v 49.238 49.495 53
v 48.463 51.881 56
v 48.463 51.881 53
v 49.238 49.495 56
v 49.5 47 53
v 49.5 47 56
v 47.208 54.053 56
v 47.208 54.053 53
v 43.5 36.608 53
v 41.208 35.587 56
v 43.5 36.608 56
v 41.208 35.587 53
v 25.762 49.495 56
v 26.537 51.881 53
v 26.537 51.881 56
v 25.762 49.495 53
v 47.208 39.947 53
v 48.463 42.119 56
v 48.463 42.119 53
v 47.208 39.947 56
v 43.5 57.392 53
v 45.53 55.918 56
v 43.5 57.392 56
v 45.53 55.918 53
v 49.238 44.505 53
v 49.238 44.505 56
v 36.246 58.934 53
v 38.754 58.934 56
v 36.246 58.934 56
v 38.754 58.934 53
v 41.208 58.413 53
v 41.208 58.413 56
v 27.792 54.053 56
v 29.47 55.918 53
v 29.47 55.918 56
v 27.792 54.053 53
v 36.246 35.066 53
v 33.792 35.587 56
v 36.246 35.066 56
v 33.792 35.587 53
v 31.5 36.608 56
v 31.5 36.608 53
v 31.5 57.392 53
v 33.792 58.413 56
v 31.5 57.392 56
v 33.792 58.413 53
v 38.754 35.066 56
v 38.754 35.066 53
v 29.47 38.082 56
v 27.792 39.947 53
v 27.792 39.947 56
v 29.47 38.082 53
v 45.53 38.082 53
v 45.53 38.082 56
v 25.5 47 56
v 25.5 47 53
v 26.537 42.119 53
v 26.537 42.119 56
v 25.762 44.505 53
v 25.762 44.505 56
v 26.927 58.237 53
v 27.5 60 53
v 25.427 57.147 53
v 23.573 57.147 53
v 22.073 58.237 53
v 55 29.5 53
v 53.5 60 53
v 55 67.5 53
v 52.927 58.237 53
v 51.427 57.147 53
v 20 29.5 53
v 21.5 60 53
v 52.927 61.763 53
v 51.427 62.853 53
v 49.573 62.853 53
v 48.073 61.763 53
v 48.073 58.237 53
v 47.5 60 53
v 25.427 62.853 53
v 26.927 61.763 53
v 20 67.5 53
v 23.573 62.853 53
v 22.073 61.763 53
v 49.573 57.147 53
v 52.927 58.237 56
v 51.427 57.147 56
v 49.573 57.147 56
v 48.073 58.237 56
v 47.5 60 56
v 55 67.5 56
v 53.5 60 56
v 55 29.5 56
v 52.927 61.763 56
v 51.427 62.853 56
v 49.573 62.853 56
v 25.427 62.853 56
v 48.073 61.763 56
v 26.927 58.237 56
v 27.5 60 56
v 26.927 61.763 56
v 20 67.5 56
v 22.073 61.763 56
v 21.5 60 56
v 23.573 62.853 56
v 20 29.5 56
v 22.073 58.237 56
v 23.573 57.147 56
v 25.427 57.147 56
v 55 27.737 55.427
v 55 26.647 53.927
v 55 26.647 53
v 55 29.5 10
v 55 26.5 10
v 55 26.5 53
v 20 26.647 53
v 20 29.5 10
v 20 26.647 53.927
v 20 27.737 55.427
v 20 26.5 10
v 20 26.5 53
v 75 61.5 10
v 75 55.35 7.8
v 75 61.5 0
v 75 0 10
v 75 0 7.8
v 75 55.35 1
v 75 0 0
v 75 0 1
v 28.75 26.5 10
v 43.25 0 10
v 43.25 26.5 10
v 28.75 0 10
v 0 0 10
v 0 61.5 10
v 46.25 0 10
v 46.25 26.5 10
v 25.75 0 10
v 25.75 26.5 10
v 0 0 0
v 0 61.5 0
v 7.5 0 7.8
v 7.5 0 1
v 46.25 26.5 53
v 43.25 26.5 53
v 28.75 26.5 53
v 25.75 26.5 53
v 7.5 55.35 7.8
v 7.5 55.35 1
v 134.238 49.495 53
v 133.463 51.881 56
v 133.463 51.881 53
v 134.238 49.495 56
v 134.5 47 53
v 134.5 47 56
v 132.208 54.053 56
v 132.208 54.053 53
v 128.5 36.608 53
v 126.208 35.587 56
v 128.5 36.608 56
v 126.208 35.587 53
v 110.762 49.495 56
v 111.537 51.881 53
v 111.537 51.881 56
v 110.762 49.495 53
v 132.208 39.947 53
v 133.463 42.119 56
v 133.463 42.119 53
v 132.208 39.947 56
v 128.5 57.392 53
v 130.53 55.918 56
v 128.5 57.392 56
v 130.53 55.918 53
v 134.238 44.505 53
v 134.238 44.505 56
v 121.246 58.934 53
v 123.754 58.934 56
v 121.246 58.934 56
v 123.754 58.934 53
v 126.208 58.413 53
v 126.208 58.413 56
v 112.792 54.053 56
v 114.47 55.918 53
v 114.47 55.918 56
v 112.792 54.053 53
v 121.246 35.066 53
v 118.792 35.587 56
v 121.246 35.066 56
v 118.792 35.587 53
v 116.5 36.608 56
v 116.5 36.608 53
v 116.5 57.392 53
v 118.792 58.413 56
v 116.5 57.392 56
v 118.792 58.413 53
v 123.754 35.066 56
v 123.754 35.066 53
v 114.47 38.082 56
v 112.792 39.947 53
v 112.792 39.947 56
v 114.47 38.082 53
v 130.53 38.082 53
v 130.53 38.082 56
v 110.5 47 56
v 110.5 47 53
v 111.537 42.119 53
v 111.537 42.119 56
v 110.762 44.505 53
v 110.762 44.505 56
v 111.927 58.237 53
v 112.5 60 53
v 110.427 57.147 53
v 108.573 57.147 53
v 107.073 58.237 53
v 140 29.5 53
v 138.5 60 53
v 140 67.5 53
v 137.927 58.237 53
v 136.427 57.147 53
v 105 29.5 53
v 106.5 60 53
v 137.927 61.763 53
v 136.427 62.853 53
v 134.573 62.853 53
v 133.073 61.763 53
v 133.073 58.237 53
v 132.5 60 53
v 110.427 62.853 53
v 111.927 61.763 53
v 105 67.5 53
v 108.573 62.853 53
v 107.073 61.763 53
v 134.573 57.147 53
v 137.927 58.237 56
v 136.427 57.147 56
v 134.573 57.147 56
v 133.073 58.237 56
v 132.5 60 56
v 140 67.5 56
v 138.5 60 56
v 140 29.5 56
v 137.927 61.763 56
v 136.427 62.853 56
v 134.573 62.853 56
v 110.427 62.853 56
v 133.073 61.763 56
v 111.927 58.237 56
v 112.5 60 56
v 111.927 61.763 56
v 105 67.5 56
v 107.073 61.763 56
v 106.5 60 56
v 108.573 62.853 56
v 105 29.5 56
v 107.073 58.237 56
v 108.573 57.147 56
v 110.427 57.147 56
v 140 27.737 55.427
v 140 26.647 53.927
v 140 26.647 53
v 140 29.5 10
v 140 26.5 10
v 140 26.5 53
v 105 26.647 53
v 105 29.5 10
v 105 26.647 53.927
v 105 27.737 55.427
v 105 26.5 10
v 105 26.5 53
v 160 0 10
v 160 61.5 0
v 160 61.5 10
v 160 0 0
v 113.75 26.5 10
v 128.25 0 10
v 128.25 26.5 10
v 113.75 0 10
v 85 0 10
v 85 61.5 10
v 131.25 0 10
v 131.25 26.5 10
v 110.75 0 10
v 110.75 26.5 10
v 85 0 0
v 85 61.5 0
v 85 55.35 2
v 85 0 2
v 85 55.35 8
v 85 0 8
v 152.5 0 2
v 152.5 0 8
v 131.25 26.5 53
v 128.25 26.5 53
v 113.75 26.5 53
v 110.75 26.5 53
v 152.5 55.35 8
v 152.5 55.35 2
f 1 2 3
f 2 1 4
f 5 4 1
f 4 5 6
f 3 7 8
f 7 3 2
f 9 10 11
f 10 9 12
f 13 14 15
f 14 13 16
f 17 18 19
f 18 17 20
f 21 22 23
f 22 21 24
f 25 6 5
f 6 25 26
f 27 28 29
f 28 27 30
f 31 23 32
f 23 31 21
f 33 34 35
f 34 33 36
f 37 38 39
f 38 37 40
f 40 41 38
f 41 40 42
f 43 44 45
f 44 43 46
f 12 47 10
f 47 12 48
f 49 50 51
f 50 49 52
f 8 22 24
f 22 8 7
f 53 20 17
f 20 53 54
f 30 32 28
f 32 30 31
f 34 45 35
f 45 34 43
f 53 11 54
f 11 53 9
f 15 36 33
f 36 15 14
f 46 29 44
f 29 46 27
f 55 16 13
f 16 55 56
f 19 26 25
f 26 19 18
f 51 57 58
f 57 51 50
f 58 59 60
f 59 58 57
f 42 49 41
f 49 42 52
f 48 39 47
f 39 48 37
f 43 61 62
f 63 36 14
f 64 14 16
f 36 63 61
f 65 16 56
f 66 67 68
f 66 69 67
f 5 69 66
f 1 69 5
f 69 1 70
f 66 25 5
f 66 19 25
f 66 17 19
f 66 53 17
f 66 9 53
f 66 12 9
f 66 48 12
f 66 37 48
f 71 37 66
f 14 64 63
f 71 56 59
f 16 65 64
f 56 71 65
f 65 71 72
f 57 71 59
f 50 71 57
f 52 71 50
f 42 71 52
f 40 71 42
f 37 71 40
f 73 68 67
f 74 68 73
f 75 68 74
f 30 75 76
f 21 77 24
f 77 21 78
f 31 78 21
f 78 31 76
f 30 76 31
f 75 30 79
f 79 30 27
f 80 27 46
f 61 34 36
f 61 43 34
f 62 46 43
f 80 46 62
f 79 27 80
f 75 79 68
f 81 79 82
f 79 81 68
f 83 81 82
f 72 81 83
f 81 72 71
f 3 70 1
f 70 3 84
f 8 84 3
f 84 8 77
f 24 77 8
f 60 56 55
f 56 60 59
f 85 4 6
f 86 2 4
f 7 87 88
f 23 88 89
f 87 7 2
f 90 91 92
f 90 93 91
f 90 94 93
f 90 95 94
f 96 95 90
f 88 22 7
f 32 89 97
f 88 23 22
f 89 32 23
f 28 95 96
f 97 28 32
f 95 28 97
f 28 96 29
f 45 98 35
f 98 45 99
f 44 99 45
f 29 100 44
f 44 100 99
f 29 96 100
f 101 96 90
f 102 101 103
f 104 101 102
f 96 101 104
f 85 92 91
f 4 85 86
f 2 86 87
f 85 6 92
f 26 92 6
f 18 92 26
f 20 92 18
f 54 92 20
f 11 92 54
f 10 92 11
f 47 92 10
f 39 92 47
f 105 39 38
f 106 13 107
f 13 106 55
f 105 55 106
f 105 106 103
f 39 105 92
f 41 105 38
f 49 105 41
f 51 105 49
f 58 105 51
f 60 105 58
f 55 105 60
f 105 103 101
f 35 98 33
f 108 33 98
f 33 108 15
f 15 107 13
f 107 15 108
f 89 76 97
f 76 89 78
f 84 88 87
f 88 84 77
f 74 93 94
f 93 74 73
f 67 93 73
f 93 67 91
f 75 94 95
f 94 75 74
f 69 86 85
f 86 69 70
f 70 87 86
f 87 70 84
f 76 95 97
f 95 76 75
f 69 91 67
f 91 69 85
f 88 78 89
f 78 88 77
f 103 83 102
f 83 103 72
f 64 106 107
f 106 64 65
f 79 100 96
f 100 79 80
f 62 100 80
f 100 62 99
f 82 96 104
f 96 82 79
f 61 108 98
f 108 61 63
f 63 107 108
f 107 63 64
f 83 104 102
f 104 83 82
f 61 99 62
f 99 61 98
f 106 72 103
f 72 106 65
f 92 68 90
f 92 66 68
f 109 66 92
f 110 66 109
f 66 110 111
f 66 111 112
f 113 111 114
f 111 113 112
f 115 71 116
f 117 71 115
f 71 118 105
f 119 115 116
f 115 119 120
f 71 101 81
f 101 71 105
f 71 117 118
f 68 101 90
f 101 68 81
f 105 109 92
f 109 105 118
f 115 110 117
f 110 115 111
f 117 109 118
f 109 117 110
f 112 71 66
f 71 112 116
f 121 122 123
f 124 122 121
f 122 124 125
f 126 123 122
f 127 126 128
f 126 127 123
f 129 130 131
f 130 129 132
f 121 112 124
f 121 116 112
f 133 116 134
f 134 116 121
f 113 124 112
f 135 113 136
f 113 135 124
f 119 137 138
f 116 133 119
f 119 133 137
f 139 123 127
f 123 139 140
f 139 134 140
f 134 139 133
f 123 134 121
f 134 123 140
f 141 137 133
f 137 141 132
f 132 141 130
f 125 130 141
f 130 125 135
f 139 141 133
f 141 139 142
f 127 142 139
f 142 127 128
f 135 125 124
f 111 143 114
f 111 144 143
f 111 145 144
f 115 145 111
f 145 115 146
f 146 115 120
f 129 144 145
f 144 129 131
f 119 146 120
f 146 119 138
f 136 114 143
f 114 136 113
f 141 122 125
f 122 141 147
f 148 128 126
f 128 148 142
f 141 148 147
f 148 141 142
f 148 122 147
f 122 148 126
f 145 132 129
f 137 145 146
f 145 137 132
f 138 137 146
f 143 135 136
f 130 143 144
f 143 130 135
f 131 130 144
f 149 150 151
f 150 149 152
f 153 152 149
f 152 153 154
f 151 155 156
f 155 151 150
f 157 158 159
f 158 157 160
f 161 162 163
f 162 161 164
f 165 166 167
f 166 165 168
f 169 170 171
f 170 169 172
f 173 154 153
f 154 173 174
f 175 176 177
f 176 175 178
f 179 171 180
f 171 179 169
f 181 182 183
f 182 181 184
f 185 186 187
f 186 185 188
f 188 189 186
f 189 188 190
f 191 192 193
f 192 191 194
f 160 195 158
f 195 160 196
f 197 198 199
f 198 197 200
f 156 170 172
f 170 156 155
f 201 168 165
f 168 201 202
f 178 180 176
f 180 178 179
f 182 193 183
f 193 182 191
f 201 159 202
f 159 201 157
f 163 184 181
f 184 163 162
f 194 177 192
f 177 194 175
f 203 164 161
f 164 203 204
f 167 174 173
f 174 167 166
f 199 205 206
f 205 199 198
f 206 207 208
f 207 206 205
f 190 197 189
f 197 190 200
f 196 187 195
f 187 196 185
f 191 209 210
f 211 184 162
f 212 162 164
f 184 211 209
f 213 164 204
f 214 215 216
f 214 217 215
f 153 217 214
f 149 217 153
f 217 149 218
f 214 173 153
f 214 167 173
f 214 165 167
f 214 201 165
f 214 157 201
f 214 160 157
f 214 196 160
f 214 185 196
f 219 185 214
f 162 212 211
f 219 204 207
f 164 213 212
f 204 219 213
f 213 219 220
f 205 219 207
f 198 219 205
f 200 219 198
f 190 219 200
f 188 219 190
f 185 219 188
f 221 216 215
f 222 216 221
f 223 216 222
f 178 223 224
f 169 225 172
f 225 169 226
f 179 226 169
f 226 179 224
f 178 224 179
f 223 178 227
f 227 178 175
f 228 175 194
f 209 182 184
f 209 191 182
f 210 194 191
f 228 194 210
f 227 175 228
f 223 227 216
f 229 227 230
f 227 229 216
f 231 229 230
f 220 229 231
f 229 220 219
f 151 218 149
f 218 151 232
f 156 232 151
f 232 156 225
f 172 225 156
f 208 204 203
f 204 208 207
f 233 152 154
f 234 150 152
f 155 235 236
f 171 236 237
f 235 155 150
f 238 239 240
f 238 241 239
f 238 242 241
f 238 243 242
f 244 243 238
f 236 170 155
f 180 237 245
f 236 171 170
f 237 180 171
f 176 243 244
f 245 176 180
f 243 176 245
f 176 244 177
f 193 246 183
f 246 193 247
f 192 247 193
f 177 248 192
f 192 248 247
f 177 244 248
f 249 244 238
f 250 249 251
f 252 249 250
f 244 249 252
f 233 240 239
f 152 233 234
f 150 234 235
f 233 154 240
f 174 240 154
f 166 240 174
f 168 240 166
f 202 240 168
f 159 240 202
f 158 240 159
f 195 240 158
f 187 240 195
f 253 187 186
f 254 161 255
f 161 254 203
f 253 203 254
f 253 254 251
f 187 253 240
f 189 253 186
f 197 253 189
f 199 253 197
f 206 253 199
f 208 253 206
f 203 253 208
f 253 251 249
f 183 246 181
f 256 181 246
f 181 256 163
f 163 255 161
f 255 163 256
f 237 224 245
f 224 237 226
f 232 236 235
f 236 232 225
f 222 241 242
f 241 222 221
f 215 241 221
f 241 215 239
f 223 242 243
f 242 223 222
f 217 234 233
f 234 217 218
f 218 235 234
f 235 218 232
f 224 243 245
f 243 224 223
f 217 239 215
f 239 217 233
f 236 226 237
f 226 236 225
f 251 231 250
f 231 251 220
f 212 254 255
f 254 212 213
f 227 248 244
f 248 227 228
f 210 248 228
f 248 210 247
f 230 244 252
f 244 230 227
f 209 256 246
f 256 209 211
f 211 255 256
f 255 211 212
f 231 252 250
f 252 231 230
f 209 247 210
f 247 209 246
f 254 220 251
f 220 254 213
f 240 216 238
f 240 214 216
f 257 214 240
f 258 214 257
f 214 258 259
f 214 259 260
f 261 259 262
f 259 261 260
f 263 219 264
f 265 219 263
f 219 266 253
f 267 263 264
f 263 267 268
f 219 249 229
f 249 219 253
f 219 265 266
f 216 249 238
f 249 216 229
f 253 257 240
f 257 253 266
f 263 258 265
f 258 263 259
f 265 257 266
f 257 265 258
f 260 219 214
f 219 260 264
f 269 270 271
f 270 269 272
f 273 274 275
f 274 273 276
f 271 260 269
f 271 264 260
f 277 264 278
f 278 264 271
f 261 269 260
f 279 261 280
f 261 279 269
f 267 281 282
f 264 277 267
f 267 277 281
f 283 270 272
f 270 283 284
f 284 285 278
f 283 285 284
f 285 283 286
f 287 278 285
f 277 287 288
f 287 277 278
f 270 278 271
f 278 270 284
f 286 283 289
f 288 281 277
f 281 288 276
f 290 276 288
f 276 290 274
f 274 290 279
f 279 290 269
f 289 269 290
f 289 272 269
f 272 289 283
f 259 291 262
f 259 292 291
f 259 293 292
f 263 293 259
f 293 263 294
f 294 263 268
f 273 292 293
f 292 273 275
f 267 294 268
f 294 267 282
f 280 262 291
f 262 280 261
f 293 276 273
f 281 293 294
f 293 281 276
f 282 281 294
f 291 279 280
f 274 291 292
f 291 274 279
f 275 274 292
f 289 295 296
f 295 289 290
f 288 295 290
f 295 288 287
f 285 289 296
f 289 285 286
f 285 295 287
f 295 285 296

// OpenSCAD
t = 10;          // base_z
tp = 3;         // support & frame thickness
t1 = 2;         // base_hole_spacing
t2 = 6.8;         // base_hole_height

r = 10;         // motor_radius
rp = 3;         // screw_radius

bt = 3;         // bracket thickness
w = 75;        // base_x
wp = 35;       // frame_x / default: w
wp1 = 4.5 - rp;        // screw_x_offset - rp

h = 61.5;        // base_y
motor_frame_height = 35;       // frame_y
hpp1 = 4.5 - 3 ;       // screw_y_offset
hppp = 0.9*h;   // base_hole_y
support_height = 43;

x_offset = (w - wp)/2;

module LeftCorner(){
    difference(){
        MotorHolder();
            color([0,1,0])      // base hole, left corner
                translate([w - 0.9*w, 0, t1/2])
                    resize([0.9*w, hppp, t2])
                        cube(1);
    }
    Bracket();
}

module RightCorner(){
    difference(){
        MotorHolder();
        color([0,1,0])      // base hole, right corner
            translate([0, 0, t1])
                resize([0.9*w, hppp, t - 2*t1])
                    cube(1);
    }
    Bracket();
}
module MotorHolder(){
    Base();
    MotorSupport();
    MotorFrame();   
}
module Base(){
    color([1,0,0])                    
        resize([w, h, t])
            cube(1);                      
}
module MotorSupport(){
    translate([x_offset, h - motor_frame_height, t])
        resize([wp, tp, support_height])
            cube(1);
}
module MotorFrame(){
    // motor face
    position = [x_offset, h - motor_frame_height + tp, support_height + t];
    difference(){                     
        translate(position)
            resize([wp, motor_frame_height + tp, tp])
                cube(1);
        MotorScrews();
    }
    // round edge
    difference(){
        translate(position + [0, - 0, 0])
            rotate([0, 90, 0])
                cylinder(r = tp, h = wp);
        translate(position - [0, 0, tp])
            cube([wp, tp, tp]);
    }
}
module MotorScrews(){
    // center
    translate([x_offset + wp/2, h - motor_frame_height/2 + tp, support_height + t])             
            cylinder(tp, r = 1.2*r, true);
    /* bottom-left
    translate([x_offset + wp1 + rp, h - motor_frame_height+ rp + hpp1 + tp, support_height + t])
        cylinder(tp, r = rp, true);
    // bottom-right
    translate([x_offset + wp - rp - wp1, h - motor_frame_height+ rp + hpp1 + tp, support_height + t]) 
        cylinder(tp, r = rp, true);*/
    // top-right
    translate([x_offset + wp - rp - wp1, h - rp - hpp1 + tp, support_height + t])      
        cylinder(tp, r = rp, true);
    // top-left
    translate([x_offset + wp1 + rp, h - rp - hpp1 + tp, support_height + t])           
        cylinder(tp, r = rp, true);
}
module Bracket(){
    module B(){
            rotate([0, -90, 0])
                linear_extrude(bt)
                    polygon(points = [
                                      [0, 0], 
                                      [0, h - motor_frame_height], 
                                      [support_height, h - motor_frame_height]
                                     ], 
                           faces =  [[0, 1, 2]]);
    }
    
    translate([0.25*wp + x_offset, 0, t]) B();
    translate([0.75*wp + x_offset, 0, t]) B();
}

LeftCorner();
translate([w + 10, 0, 0]) RightCorner();
